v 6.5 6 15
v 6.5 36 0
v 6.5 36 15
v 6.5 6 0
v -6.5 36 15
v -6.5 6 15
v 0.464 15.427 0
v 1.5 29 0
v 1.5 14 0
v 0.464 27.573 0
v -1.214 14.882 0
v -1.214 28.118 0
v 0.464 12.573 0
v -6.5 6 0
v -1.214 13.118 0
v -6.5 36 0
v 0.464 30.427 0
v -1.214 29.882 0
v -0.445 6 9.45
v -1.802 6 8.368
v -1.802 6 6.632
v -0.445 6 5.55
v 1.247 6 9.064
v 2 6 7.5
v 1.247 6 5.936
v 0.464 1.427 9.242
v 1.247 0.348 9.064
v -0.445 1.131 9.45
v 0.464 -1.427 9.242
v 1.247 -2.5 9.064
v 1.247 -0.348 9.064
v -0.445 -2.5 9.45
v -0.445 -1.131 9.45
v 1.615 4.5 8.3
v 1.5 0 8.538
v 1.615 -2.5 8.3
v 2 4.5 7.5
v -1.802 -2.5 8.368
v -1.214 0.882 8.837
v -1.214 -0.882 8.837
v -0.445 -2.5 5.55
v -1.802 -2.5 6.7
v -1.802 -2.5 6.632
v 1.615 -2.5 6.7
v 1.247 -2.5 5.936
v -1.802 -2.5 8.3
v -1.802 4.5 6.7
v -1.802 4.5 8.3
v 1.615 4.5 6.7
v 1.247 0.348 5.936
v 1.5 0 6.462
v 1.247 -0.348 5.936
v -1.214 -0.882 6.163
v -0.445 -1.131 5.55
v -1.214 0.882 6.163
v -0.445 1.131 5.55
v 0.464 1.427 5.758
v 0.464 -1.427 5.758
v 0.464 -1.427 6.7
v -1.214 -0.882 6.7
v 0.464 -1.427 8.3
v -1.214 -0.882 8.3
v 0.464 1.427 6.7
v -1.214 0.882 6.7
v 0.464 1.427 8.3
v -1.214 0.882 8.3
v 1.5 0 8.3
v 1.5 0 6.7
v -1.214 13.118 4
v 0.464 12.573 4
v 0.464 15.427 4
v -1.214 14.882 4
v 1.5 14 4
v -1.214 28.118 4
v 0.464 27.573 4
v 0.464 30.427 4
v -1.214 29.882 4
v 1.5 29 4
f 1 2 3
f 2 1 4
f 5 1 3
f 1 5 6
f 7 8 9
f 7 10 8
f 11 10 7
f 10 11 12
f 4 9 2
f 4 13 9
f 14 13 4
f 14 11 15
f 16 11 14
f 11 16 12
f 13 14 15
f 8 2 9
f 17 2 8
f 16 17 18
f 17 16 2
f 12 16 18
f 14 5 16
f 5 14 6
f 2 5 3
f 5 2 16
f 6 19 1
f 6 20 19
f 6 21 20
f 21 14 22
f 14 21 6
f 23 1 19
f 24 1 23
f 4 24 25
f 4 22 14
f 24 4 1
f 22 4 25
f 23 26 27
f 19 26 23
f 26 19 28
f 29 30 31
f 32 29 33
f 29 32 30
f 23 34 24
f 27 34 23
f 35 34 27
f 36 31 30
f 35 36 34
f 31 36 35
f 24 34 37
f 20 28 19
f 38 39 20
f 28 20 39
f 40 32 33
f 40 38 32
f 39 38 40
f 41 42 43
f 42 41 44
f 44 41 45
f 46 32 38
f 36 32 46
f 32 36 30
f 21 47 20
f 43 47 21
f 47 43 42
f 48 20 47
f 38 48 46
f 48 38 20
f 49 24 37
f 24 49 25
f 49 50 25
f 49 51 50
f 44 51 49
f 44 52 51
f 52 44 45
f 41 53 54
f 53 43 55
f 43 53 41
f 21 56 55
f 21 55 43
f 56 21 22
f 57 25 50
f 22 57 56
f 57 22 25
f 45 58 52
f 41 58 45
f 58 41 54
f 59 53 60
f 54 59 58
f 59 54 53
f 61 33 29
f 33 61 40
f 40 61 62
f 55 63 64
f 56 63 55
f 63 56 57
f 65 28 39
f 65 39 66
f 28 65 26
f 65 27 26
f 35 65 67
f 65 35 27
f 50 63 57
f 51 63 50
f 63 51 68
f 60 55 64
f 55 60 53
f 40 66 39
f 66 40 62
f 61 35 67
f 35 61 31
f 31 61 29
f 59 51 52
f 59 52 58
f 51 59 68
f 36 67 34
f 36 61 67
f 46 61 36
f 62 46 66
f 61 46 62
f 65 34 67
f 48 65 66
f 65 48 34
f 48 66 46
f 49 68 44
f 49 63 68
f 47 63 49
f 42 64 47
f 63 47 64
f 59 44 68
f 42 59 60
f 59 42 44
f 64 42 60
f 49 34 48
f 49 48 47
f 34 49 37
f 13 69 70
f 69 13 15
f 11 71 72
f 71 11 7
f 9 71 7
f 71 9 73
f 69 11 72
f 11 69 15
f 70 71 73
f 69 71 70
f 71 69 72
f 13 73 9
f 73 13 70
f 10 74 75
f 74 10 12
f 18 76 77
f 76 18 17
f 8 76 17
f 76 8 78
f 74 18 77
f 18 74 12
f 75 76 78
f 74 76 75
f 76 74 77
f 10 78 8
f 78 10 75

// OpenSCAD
// file: global_preferences.scad
color_electronics = [1, 0, 0];
color_hardware = [0, 0, 1];

flipper_rotation_angle = 45; //Degrees rotation when activated.
// file: physical_dimensions.scad
//Physically bound settings.
printing_play = 0.2; //Horizontal error in 3D printing.
printing_overhang = 50; //Maximum overhang angle. 90 is perfect bridging. 0 is no overhang possible.
movement_play = 0.2; //Play to leave if stuff has to move past each other.

m3_bolt_radius = 1.5;
m3_nut_radius = 5.5 / 2;
m3_nut_height = 2.4;

ball_radius = 15; //Standard pinball size (7/6 inch).
ball_slit = ball_radius * 2 + movement_play * 2 + 4; //Allow 4mm extra space to make the ball fall through faster.

cabinet_thickness = 10; //1cm wooden planks.

flipper_solenoid_width = 13;
flipper_solenoid_height = 15;
flipper_solenoid_length = 30;
flipper_solenoid_pin_radius = 2;
flipper_solenoid_pin_retracted = 8.5; //Length when retracted.
flipper_solenoid_pin_expansion = 10; //Additional length when expanded.
flipper_solenoid_pinhole_position = 2.5; //Distance from centre of hole to tip of pin.
flipper_solenoid_pinhole_radius = m3_bolt_radius;
flipper_solenoid_pingap_thickness = 1.6;
flipper_solenoid_pingap_depth = 7;
flipper_solenoid_screw_radius = m3_bolt_radius;
flipper_solenoid_screw1_position = 8; //Distance from front.
flipper_solenoid_screw2_position = 15 + flipper_solenoid_screw1_position;
flipper_solenoid_screw_depth = 4; //Unknown.

hexkey_radius = 2; //Radius of circumscribed circle around hex key.
hexkey_short_length = 30; //Length of short end.//TODO: How long is this?
hexkey_long_length = 100; //TODO: How long is this?
hexkey_turn_radius = 10; //TODO: Also unknown.

matrix_size = [320, 160]; //Size of LED matrix.

playfield_width = 610;
playfield_height = 1220;
playfield_slope = 6; //Degrees.
playfield_thickness = 18;

space_bottom = 100;
space_top = 100;
space_top_back = 200;

spring_end_thickness = 2; //How thick the attachment part of the spring is.
spring_radius = 4; //Radius of the coil of the spring.
// main file
include <physical_dimensions.scad>
include <global_preferences.scad>

module flipper_solenoid(expansion = 0) {
	color(color_electronics) {
		difference() {
			union() {
				translate([-flipper_solenoid_width / 2, flipper_solenoid_pin_retracted - flipper_solenoid_pinhole_position]) {
					cube([flipper_solenoid_width, flipper_solenoid_length, flipper_solenoid_height]);
				}
				translate([0, flipper_solenoid_pin_retracted - flipper_solenoid_pinhole_position, flipper_solenoid_height / 2]) {
					rotate([90, 0, 0]) {
						cylinder(r=flipper_solenoid_pin_radius, h=flipper_solenoid_pin_retracted + expansion);
					}
				}
			}
			translate([0, -expansion, 0]) { //Pin hole.
				cylinder(r=flipper_solenoid_pinhole_radius, h=flipper_solenoid_height);
			}
			translate([-flipper_solenoid_pin_radius, -flipper_solenoid_pinhole_position - expansion, flipper_solenoid_height / 2 - flipper_solenoid_pingap_thickness / 2]) {
				cube([flipper_solenoid_pin_radius * 2, flipper_solenoid_pingap_depth, flipper_solenoid_pingap_thickness]);
			}
			translate([0, flipper_solenoid_pin_retracted - flipper_solenoid_pinhole_position + flipper_solenoid_screw1_position, 0]) {
				cylinder(r=flipper_solenoid_screw_radius, h=flipper_solenoid_screw_depth);
			}
			translate([0, flipper_solenoid_pin_retracted - flipper_solenoid_pinhole_position + flipper_solenoid_screw2_position, 0]) {
				cylinder(r=flipper_solenoid_screw_radius, h=flipper_solenoid_screw_depth);
			}
		}
	}
}

flipper_solenoid($t * 10);
